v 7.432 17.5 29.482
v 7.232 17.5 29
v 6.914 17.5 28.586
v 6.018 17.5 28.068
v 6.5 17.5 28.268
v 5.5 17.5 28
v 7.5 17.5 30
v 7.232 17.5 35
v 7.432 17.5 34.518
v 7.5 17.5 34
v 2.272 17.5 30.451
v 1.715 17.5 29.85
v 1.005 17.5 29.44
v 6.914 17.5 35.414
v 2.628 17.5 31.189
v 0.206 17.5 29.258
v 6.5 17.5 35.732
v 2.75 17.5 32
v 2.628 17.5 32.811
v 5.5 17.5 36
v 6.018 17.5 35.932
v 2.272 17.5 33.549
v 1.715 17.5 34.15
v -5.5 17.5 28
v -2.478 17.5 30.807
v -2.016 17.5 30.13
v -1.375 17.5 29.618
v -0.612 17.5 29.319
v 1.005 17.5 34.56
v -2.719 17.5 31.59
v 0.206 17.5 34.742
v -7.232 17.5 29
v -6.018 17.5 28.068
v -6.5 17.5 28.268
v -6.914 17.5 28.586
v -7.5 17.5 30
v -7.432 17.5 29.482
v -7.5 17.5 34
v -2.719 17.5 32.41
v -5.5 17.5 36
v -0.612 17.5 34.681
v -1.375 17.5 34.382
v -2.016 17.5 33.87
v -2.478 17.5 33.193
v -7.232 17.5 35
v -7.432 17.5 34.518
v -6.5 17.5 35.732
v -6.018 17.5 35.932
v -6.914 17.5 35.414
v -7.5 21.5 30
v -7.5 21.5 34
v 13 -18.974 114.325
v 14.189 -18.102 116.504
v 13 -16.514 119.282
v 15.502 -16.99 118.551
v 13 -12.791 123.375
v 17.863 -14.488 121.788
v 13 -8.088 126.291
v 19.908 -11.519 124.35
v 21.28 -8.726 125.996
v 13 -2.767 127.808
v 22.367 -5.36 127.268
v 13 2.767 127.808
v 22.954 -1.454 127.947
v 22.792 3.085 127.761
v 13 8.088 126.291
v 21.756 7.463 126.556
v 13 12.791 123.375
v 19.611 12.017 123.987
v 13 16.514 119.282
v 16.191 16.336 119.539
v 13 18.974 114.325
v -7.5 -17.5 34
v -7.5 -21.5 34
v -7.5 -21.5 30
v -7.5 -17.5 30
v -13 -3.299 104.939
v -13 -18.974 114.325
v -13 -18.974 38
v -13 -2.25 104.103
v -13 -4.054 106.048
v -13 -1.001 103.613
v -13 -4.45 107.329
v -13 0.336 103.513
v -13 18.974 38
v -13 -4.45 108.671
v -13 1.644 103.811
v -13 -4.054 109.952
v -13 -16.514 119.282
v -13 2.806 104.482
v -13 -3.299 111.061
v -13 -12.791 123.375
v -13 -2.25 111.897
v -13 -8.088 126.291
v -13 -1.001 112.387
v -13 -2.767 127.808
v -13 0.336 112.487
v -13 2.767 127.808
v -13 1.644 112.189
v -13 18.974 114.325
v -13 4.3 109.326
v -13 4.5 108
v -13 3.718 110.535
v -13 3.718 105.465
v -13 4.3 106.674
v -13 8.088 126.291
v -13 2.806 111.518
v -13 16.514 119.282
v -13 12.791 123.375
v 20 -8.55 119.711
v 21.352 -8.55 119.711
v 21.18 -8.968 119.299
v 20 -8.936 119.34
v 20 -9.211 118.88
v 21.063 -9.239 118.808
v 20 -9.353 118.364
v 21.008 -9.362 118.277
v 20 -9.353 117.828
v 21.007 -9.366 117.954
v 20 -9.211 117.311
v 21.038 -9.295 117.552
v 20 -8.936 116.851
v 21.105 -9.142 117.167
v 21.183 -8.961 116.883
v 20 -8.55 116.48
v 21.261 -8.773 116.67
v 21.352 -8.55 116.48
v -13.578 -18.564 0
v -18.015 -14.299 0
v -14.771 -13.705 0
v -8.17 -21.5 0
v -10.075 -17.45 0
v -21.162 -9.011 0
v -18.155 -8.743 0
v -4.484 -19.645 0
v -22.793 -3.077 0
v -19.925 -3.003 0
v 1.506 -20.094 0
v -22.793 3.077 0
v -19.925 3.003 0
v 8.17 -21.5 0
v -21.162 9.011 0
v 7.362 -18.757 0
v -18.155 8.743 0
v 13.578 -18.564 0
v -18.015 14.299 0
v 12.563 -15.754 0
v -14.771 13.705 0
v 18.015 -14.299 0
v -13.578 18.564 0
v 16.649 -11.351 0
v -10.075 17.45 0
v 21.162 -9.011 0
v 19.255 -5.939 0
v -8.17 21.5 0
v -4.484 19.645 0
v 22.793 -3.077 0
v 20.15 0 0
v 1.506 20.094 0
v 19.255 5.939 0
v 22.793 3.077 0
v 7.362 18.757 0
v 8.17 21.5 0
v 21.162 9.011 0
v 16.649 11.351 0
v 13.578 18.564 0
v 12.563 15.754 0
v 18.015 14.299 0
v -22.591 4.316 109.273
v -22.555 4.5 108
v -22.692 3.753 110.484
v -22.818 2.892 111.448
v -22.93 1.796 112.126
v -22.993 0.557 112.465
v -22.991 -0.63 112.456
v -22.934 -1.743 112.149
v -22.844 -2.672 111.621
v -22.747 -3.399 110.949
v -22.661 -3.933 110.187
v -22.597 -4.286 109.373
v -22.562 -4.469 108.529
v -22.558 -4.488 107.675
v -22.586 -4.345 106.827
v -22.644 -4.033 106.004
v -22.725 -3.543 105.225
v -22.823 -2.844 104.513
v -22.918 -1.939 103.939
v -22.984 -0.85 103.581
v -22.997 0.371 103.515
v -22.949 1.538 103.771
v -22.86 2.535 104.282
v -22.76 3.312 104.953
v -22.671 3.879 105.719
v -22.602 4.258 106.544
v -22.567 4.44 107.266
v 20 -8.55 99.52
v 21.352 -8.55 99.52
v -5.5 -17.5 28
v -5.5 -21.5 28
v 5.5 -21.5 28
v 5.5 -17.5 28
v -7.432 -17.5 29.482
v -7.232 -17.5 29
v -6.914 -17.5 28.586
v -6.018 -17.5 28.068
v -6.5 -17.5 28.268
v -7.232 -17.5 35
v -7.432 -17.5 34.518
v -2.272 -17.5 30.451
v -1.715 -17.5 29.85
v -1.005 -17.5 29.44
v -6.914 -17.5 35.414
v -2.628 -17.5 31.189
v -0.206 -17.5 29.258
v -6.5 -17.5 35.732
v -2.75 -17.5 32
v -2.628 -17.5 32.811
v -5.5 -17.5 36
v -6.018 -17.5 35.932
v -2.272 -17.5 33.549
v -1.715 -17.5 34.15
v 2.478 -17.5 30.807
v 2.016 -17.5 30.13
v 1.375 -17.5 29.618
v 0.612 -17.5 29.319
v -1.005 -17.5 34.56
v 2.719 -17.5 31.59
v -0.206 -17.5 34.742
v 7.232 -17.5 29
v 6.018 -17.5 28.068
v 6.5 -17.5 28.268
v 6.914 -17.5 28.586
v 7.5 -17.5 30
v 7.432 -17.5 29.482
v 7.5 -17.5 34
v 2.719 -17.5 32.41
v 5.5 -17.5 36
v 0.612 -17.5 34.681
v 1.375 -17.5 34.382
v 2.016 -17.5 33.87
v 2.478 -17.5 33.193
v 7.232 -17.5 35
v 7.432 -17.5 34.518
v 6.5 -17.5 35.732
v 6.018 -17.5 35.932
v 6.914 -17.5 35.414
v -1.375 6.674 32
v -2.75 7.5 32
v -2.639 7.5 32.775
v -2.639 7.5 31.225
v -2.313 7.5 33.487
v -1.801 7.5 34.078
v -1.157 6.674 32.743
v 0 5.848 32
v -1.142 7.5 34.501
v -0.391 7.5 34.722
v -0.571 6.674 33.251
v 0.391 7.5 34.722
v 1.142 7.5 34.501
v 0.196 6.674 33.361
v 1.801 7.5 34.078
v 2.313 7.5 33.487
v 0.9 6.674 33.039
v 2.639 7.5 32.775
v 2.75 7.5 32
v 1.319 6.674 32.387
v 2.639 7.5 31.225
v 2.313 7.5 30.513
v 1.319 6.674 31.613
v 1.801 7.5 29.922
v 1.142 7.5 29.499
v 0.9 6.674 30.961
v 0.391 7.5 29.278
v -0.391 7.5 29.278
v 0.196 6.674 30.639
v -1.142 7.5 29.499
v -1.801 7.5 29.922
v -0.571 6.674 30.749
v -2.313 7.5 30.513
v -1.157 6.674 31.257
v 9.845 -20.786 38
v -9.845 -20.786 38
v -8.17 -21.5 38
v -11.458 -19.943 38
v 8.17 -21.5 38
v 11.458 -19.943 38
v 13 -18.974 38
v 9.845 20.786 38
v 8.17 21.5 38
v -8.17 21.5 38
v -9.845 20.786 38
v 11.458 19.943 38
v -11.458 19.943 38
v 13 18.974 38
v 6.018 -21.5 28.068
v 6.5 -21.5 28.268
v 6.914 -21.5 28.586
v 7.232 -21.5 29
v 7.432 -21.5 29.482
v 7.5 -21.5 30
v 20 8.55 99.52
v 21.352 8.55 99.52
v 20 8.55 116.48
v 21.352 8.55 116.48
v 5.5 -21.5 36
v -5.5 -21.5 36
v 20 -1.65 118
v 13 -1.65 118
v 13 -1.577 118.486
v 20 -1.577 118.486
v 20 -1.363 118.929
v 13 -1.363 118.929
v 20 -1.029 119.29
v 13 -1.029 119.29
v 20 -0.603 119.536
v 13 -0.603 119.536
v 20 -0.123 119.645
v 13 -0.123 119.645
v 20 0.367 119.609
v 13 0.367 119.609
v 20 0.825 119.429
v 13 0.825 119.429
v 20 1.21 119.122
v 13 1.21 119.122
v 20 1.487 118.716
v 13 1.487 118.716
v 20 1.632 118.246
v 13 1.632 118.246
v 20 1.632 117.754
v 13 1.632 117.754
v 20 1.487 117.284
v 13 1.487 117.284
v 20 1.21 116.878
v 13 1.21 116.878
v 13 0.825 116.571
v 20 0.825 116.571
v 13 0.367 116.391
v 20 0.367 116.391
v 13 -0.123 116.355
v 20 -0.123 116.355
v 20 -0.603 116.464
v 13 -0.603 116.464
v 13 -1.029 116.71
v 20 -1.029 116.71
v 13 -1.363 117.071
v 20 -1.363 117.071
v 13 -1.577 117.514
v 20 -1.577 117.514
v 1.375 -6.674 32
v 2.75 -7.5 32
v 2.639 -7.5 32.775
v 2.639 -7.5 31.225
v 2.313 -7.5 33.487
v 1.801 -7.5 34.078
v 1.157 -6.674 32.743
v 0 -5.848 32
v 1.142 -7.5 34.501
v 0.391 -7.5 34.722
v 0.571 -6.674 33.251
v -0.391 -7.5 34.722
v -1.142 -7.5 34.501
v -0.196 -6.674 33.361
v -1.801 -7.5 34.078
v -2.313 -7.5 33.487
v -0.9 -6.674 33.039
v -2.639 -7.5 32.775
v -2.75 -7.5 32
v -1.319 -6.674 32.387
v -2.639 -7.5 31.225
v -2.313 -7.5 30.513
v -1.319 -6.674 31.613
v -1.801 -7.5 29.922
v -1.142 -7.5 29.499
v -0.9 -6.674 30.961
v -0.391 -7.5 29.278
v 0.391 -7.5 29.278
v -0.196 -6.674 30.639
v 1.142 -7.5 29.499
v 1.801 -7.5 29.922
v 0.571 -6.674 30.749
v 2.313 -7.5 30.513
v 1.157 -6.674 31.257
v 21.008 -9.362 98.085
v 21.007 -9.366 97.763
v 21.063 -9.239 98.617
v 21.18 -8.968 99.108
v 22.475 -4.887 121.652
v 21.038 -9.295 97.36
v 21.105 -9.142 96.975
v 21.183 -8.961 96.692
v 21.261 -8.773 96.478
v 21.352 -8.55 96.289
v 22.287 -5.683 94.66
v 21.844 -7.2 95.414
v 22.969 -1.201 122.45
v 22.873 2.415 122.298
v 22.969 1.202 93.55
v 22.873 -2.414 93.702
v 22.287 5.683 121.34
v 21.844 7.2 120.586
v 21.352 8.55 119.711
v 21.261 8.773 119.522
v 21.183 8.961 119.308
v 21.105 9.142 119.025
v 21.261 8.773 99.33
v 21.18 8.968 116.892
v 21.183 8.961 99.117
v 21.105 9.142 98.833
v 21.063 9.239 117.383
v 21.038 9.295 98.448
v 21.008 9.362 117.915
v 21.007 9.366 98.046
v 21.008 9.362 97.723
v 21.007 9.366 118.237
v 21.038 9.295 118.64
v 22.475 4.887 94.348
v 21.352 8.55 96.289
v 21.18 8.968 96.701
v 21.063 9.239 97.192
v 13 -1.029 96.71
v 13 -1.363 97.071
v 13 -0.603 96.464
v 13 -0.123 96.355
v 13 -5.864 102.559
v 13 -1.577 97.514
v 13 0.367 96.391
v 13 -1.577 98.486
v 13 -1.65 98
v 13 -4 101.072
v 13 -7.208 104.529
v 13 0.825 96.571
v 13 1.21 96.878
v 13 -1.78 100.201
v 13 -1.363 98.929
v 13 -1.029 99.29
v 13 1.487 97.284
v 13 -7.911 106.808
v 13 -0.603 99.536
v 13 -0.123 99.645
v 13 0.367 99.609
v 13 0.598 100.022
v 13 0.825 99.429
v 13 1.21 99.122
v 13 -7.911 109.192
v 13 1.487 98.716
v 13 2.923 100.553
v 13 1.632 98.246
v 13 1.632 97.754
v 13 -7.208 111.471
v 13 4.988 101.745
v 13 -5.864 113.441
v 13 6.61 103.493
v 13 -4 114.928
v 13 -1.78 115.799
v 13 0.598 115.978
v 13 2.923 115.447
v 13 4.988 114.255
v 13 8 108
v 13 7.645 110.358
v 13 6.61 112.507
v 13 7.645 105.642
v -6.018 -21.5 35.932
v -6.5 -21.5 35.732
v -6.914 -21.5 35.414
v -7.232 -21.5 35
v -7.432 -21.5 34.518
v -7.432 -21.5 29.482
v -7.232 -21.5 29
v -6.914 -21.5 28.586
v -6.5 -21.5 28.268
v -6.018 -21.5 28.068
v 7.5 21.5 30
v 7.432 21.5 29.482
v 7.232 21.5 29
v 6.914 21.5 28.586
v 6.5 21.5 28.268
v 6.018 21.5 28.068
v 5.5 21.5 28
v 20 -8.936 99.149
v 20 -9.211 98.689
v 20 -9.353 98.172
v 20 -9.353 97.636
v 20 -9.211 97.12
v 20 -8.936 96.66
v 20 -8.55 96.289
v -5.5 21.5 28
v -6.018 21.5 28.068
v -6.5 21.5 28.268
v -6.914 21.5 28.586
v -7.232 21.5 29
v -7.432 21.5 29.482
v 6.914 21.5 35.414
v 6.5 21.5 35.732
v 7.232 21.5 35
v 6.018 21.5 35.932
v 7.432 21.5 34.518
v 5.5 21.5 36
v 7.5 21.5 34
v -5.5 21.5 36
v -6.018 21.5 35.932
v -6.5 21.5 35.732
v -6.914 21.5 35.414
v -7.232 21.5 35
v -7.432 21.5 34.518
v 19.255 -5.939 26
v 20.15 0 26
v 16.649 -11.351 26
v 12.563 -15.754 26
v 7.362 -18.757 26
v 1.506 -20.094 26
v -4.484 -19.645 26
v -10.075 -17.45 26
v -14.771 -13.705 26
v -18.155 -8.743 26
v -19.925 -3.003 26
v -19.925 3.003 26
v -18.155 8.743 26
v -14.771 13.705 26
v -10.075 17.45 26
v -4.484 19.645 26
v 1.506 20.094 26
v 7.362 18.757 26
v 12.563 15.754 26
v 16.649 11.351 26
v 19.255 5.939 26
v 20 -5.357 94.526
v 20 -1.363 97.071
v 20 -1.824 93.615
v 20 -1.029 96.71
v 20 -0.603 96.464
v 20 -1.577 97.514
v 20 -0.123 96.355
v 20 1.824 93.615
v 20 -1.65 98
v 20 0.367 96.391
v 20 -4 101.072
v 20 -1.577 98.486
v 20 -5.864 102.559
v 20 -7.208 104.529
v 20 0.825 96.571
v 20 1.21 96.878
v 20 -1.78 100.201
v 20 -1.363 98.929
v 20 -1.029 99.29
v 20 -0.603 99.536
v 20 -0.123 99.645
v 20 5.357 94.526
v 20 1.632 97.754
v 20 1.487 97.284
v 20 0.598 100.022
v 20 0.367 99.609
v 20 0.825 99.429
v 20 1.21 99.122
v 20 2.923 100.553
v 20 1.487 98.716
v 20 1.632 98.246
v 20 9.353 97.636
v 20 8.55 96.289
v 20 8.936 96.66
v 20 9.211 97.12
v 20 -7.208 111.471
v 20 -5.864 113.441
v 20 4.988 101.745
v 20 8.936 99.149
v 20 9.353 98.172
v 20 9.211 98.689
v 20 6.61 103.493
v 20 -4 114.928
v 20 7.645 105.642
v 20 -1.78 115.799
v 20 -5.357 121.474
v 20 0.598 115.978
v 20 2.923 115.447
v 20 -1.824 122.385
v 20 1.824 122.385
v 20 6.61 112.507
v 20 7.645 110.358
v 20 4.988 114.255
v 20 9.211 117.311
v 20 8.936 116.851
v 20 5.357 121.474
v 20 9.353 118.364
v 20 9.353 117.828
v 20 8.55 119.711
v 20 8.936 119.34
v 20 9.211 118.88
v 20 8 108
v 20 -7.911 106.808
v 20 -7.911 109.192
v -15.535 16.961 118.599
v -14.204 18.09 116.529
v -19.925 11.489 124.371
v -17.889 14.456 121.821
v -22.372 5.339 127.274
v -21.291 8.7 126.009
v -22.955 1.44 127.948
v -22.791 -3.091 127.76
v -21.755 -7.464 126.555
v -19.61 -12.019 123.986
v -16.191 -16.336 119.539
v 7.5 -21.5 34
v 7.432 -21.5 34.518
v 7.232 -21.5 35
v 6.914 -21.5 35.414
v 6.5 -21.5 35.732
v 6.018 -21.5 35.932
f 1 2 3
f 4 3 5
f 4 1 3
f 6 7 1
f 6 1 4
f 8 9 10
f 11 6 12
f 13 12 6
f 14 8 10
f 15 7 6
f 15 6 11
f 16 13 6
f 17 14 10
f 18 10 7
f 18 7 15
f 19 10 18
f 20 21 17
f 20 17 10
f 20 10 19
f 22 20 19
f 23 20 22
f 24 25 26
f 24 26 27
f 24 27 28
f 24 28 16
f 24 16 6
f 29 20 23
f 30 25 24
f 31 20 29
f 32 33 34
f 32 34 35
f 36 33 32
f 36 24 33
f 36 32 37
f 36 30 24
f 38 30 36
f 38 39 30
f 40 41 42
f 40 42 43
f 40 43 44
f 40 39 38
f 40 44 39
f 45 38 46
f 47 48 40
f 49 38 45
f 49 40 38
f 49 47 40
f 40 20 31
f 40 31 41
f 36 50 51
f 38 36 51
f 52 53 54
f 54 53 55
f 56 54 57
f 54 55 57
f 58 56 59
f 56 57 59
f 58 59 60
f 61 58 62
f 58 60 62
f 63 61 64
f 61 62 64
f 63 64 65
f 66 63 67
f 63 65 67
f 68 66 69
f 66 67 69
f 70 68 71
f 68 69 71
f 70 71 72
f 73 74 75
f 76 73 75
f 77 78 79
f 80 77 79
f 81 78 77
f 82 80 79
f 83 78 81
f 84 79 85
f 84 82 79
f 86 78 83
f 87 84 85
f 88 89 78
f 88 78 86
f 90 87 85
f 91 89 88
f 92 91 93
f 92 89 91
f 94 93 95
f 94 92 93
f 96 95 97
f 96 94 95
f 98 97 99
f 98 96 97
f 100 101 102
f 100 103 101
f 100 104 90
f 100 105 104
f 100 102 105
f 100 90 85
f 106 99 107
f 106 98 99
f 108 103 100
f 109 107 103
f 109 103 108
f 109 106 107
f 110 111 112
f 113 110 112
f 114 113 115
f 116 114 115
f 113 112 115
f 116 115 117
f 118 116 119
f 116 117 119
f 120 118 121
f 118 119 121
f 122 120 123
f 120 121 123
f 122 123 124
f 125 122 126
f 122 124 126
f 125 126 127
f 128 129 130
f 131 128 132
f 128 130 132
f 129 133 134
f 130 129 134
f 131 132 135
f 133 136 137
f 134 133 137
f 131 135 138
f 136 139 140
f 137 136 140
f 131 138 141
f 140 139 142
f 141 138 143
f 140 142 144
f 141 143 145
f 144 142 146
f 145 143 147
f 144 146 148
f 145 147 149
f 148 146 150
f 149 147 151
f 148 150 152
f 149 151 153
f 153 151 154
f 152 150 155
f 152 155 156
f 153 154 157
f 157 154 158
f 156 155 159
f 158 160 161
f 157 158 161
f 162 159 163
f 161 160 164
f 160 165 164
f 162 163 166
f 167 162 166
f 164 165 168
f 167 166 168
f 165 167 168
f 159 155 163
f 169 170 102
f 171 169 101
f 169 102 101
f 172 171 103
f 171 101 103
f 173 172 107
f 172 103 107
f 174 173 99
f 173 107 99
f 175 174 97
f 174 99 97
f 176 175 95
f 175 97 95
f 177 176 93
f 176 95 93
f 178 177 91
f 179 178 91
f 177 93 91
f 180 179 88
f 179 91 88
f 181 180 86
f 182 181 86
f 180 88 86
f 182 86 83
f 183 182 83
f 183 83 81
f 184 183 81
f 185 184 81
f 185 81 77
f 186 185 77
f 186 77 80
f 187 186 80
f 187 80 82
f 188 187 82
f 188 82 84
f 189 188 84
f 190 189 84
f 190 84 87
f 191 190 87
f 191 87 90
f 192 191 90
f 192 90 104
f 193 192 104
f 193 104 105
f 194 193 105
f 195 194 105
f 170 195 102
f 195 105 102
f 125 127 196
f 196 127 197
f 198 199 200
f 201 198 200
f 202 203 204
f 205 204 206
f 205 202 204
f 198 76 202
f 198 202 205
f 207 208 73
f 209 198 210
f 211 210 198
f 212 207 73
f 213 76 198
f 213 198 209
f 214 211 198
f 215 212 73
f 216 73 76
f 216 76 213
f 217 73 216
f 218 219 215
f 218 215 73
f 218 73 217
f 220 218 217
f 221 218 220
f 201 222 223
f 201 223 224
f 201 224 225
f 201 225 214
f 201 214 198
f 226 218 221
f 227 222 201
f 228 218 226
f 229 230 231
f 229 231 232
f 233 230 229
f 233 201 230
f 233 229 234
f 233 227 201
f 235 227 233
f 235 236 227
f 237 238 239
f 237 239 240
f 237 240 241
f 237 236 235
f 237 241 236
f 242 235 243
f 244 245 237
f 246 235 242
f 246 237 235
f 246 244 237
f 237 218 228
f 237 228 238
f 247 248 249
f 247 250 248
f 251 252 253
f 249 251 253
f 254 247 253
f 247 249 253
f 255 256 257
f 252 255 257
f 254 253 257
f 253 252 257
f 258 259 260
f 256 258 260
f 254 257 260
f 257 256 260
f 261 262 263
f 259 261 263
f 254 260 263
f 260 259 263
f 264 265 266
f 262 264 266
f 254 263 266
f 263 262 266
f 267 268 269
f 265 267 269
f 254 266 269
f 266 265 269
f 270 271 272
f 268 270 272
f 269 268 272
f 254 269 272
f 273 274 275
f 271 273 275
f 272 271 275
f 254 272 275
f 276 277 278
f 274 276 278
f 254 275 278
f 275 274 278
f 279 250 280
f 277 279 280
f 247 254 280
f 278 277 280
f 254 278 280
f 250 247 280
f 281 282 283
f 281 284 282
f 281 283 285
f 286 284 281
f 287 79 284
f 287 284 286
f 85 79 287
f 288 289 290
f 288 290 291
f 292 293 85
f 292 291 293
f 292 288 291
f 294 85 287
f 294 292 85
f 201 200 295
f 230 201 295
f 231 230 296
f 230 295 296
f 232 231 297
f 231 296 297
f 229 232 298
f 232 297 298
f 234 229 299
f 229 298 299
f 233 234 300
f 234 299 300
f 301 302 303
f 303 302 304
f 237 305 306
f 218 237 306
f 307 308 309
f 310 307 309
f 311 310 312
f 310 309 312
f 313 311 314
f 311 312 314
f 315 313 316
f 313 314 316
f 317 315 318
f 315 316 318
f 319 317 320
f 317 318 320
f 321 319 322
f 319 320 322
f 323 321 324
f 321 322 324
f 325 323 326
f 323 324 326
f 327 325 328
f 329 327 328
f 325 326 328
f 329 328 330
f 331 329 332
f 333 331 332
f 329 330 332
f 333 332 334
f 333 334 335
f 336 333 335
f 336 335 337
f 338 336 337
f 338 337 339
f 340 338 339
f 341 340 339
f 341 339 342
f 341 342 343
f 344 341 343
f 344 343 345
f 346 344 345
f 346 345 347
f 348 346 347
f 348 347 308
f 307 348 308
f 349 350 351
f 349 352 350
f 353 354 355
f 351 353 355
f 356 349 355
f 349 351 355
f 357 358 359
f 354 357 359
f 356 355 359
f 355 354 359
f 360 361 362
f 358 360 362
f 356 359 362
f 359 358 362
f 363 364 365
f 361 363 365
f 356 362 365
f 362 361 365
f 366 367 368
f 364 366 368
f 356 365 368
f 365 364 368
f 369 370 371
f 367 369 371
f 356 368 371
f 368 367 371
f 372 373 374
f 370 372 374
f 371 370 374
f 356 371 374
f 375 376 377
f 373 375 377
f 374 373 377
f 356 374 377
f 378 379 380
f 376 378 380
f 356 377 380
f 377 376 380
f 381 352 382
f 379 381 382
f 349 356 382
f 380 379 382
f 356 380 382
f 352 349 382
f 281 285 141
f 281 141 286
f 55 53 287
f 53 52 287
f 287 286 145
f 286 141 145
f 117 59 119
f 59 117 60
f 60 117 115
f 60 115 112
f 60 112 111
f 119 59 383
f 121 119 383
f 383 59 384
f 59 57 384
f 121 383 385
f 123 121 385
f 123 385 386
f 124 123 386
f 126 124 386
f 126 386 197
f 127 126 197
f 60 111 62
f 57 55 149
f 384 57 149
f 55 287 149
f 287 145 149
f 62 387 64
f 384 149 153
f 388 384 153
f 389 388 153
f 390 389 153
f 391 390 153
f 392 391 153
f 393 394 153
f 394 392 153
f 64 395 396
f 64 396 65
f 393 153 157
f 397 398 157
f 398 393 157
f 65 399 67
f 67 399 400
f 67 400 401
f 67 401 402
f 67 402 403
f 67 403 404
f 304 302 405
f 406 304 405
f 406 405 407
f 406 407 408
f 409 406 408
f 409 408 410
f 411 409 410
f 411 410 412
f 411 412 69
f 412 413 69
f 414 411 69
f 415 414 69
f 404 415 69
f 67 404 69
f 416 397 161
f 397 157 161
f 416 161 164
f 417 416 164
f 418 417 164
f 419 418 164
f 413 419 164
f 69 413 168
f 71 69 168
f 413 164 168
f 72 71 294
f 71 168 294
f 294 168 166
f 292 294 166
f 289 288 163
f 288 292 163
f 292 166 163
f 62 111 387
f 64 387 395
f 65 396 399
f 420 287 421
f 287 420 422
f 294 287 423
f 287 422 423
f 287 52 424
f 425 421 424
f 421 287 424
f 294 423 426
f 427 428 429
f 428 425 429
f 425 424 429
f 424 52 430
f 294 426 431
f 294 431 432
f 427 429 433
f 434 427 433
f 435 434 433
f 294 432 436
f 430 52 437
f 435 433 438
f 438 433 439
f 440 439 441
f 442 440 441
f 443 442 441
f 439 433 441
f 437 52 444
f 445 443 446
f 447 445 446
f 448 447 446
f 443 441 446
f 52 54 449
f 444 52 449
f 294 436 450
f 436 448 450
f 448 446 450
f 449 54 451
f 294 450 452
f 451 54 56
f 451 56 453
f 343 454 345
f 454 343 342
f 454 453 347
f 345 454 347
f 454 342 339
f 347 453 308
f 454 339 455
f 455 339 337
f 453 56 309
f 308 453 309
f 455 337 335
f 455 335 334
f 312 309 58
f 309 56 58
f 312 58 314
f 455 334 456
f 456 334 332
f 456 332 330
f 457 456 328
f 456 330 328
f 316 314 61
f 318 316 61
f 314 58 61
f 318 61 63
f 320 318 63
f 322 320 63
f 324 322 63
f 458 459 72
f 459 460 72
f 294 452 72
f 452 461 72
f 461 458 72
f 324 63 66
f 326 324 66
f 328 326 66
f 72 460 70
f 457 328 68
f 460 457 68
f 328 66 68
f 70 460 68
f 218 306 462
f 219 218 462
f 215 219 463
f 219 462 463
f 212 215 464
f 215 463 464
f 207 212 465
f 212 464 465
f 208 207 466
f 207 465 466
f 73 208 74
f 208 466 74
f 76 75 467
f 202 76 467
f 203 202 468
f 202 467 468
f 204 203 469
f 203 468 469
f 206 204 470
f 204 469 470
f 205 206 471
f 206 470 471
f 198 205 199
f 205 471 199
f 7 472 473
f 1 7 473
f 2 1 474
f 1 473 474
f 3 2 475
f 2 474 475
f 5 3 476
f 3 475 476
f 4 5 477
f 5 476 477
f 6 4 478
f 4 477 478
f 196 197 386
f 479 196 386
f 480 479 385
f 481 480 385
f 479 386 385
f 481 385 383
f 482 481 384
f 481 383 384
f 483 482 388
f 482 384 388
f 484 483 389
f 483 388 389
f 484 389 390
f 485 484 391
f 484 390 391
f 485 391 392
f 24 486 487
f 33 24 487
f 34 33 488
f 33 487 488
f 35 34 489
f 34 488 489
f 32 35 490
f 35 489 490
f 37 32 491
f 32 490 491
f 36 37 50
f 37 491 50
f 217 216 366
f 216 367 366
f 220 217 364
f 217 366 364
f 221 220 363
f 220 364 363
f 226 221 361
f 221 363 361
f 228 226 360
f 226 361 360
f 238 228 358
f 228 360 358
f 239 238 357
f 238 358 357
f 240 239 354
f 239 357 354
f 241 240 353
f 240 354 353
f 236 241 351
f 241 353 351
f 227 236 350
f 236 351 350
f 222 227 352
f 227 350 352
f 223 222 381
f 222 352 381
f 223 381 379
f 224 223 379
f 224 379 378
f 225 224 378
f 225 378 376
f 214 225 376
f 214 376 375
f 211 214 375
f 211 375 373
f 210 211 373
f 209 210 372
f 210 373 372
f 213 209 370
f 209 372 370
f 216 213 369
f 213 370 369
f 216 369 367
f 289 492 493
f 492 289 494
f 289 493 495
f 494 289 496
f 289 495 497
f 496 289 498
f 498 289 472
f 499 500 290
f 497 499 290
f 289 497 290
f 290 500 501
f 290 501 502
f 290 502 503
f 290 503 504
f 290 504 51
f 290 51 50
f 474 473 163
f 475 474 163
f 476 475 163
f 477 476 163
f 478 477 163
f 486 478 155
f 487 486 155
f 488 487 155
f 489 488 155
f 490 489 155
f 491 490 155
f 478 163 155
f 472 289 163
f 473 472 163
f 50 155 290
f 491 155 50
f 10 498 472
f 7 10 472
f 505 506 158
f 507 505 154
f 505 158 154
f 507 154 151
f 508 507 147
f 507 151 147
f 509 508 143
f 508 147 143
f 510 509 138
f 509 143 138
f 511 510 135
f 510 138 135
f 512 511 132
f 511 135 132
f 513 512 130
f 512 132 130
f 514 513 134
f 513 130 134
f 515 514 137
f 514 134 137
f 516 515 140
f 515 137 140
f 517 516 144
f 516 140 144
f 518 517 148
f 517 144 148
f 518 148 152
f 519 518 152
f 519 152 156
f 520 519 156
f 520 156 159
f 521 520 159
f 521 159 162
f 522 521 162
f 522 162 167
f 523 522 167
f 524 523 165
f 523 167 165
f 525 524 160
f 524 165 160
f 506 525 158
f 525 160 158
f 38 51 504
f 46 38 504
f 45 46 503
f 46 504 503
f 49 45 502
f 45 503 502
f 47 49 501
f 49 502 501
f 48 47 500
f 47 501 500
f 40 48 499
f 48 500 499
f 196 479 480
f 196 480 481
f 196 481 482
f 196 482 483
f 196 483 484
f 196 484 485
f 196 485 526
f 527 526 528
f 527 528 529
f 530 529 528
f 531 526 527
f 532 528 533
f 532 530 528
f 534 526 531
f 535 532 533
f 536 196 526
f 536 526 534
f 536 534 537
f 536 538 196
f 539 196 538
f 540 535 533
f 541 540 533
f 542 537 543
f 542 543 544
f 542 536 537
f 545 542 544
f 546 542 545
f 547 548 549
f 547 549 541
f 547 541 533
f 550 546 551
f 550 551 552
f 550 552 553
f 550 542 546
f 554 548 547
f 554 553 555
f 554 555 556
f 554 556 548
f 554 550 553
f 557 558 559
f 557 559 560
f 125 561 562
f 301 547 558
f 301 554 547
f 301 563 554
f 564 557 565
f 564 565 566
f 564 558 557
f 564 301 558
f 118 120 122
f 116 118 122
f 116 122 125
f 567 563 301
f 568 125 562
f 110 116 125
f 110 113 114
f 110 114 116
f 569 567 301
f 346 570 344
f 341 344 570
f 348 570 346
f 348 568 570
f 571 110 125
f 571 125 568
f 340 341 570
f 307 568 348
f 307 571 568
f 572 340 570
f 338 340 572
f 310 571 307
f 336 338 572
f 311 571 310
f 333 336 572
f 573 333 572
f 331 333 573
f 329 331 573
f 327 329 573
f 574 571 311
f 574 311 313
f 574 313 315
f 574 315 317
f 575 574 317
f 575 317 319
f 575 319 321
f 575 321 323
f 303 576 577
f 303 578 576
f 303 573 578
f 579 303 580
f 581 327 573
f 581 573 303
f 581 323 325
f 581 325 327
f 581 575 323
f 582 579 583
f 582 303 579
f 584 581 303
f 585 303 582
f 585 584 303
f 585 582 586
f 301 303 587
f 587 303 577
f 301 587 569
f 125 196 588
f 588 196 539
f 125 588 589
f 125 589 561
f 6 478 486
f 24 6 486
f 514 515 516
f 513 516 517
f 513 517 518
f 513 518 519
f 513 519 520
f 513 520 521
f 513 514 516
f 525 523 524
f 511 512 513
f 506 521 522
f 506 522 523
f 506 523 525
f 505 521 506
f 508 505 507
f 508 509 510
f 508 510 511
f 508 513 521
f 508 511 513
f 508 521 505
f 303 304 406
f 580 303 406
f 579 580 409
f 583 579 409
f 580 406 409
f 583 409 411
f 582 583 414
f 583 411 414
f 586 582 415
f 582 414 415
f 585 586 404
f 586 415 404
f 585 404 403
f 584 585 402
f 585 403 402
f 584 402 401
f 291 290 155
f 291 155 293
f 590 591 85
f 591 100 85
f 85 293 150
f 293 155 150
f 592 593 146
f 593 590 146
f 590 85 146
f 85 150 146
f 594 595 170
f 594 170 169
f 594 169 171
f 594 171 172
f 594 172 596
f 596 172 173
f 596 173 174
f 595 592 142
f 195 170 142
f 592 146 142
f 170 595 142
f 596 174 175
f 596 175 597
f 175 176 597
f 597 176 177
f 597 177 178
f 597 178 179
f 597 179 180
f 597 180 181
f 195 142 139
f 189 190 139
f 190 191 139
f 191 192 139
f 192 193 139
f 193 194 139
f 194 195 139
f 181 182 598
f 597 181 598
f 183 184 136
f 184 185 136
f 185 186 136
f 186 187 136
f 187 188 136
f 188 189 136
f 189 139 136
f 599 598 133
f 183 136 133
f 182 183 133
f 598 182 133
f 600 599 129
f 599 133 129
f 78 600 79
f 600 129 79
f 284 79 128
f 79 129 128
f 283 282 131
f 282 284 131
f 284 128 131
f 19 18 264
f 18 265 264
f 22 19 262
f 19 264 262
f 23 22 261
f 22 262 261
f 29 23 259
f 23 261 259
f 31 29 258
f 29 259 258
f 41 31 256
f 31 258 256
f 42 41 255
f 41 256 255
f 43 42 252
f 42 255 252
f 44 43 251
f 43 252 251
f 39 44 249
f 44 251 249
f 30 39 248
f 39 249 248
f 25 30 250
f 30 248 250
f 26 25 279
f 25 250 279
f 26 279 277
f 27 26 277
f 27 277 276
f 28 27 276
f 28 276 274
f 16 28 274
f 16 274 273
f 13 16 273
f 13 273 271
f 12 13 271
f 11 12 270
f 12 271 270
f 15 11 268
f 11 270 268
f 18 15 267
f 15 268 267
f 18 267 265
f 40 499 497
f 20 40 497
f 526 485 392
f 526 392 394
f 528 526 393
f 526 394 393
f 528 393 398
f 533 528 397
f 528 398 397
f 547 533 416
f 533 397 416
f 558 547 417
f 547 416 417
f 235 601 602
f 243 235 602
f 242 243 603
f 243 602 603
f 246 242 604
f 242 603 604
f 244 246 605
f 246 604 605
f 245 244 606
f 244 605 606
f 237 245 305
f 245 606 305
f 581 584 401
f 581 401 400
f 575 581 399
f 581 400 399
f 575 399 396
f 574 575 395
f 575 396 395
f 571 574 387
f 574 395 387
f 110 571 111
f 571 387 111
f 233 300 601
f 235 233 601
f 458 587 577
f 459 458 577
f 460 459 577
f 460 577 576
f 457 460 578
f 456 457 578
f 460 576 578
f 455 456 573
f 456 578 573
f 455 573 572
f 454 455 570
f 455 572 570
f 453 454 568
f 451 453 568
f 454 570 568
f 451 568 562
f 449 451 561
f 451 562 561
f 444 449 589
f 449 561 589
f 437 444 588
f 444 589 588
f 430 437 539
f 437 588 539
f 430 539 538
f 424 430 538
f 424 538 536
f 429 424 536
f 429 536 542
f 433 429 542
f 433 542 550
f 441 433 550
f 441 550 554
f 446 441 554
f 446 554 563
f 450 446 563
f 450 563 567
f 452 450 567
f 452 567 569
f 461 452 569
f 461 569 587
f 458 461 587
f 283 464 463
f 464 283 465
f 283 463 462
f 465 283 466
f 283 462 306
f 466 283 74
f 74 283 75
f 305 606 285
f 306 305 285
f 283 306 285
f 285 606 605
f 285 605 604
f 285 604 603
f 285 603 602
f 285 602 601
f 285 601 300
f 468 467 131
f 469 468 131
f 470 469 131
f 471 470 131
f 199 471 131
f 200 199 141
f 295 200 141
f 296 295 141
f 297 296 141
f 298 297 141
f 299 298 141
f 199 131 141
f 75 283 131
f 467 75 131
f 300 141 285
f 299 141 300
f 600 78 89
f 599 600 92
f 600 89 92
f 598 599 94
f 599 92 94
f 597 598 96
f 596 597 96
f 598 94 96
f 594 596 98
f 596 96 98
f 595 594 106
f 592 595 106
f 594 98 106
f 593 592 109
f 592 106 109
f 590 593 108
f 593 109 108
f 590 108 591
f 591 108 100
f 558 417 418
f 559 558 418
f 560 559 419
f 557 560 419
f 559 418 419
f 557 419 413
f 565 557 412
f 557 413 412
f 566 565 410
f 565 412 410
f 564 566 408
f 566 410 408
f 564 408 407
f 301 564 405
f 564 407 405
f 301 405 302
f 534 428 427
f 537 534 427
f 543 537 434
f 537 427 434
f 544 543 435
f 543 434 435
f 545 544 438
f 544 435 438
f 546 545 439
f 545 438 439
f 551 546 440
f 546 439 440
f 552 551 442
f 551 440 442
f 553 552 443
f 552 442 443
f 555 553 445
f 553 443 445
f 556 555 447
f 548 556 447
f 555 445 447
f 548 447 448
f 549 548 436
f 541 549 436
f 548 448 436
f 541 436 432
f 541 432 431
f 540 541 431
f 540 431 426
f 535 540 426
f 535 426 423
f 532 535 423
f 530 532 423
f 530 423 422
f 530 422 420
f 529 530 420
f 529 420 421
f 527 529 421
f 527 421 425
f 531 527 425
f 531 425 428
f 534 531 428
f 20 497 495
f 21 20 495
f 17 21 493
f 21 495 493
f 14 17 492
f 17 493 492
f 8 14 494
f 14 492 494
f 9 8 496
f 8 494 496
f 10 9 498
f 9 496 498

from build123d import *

# Parameters (mm, degrees)
F1_DEPTH  = 128
F3_W      = 26
F3_H      = 46
F4_DEPTH  = 90
F6_DEPTH  = 46.001
F8_DEPTH  = 3
F10_D     = 3.3
F10_DEPTH = 20
F10_TIP   = 0.9914200214
F11_R     = 8
F12_DEPTH = 25
F13_R     = 4.5
F14_DEPTH = 10.0010001
F15_R     = 20.15
F16_DEPTH = 26
F18_DEPTH = 4
F20_D     = 5.5
F20_DEPTH = 10
F20_TIP   = 1.6523667023
F22_DEPTH = 4
F24_D     = 5.5
F24_DEPTH = 10
F24_TIP   = 1.6523667023


with BuildPart() as f1:
    # F0 (on Top) → F1 (new body)
    with BuildSketch(Plane.XY):
        with BuildLine():
            Line((8.1700673192, 21.5), (-8.1700673192, 21.5))
            ThreePointArc((-8.1700673192, 21.5), (-23, 0), (-8.1700673192, -21.5))
            Line((-8.1700673192, -21.5), (8.1700673192, -21.5))
            ThreePointArc((8.1700673192, -21.5), (23, 0), (8.1700673192, 21.5))
        make_face()
    extrude(amount=F1_DEPTH)

    # F3 (on face) → F4 (cut)
    with BuildSketch(Plane.XY.offset(128)):
        Rectangle(F3_W, F3_H)
    extrude(amount=-F4_DEPTH, mode=Mode.SUBTRACT)

    # F5 (on offset) → F6 (cut, through all)
    with BuildSketch(Plane.YZ.offset(23)):
        with BuildLine():
            ThreePointArc((-19.9933908829, 108.5141215848), (-0.0190112138, 127.9999909643), (19.9923773451, 108.5521305014))
            Line((19.9923773451, 108.5521305014), (24.1833440959, 131.3719953258))
            Line((24.1833440959, 131.3719953258), (-19.9933908829, 131.3719953258))
            Line((-19.9933908829, 131.3719953258), (-19.9933908829, 108.5141215848))
        make_face()
    extrude(amount=-F6_DEPTH, mode=Mode.SUBTRACT)

    # F7 (on offset) → F8 (cut)
    with BuildSketch(Plane.YZ.offset(23)):
        with BuildLine():
            ThreePointArc((-8.55, 99.5196213389), (-9.3706896552, 97.9043111178), (-8.55, 96.2890008966))
            ThreePointArc((-8.55, 96.2890008966), (0, 93.5), (8.55, 96.2890008966))
            ThreePointArc((8.55, 96.2890008966), (9.3706896552, 97.9043111178), (8.55, 99.5196213389))
            Line((8.55, 99.5196213389), (8.55, 116.4803786611))
            ThreePointArc((8.55, 116.4803786611), (9.3706896552, 118.0956888822), (8.55, 119.7109991034))
            ThreePointArc((8.55, 119.7109991034), (0, 122.5), (-8.55, 119.7109991034))
            ThreePointArc((-8.55, 119.7109991034), (-9.3706896552, 118.0956888822), (-8.55, 116.4803786611))
            Line((-8.55, 116.4803786611), (-8.55, 99.5196213389))
        make_face()
    extrude(amount=-F8_DEPTH, mode=Mode.SUBTRACT)

    # F10
    with Locations(Plane.YZ.offset(20)):
        with Locations((0, 118), (0, 98)):
            Hole(F10_D / 2, depth=F10_DEPTH)
            with Locations((0, 0, -(F10_DEPTH + F10_TIP / 2))):  # 118° drill point
                Cone(0, F10_D / 2, F10_TIP, mode=Mode.SUBTRACT)

    # F11 (on face) → F12 (cut)
    with BuildSketch(Plane.YZ.offset(20)):
        with Locations((0, 108)):
            Circle(F11_R)
    extrude(amount=-F12_DEPTH, mode=Mode.SUBTRACT)

    # F13 (on face) → F14 (cut, through all)
    with BuildSketch(Plane.YZ.offset(-13)):
        with Locations((0, 108)):
            Circle(F13_R)
    extrude(amount=-F14_DEPTH, mode=Mode.SUBTRACT)

    # F15 (on face) → F16 (cut)
    with BuildSketch(Plane(origin=(0, 0, 0), x_dir=(1, 0, 0), z_dir=(0, 0, -1))):
        Circle(F15_R)
    extrude(amount=-F16_DEPTH, mode=Mode.SUBTRACT)

    # F17 (on face) → F18 (cut)
    with BuildSketch(Plane.XZ.offset(21.5)):
        with BuildLine():
            Line((5.5, 36), (-5.5, 36))
            ThreePointArc((-5.5, 36), (-6.9142135624, 35.4142135624), (-7.5, 34))
            Line((-7.5, 34), (-7.5, 30))
            ThreePointArc((-7.5, 30), (-6.9142135624, 28.5857864376), (-5.5, 28))
            Line((-5.5, 28), (5.5, 28))
            ThreePointArc((5.5, 28), (6.9142135624, 28.5857864376), (7.5, 30))
            Line((7.5, 30), (7.5, 34))
            ThreePointArc((7.5, 34), (6.9142135624, 35.4142135624), (5.5, 36))
        make_face()
    extrude(amount=-F18_DEPTH, mode=Mode.SUBTRACT)

    # F20
    with Locations(Plane.XZ.offset(17.5)):
        with Locations((0, 32)):
            Hole(F20_D / 2, depth=F20_DEPTH)
            with Locations((0, 0, -(F20_DEPTH + F20_TIP / 2))):  # 118° drill point
                Cone(0, F20_D / 2, F20_TIP, mode=Mode.SUBTRACT)

    # F21 (on face) → F22 (cut)
    with BuildSketch(Plane(origin=(0, 21.5, 0), x_dir=(-1, 0, 0), z_dir=(0, 1, 0))):
        with BuildLine():
            Line((5.5, 36), (-5.5, 36))
            ThreePointArc((-5.5, 36), (-6.9142135624, 35.4142135624), (-7.5, 34))
            Line((-7.5, 34), (-7.5, 30))
            ThreePointArc((-7.5, 30), (-6.9142135624, 28.5857864376), (-5.5, 28))
            Line((-5.5, 28), (5.5, 28))
            ThreePointArc((5.5, 28), (6.9142135624, 28.5857864376), (7.5, 30))
            Line((7.5, 30), (7.5, 34))
            ThreePointArc((7.5, 34), (6.9142135624, 35.4142135624), (5.5, 36))
        make_face()
    extrude(amount=-F22_DEPTH, mode=Mode.SUBTRACT)

    # F24
    with Locations(Plane(origin=(0, 17.5, 0), x_dir=(-1, 0, 0), z_dir=(0, 1, 0))):
        with Locations((0, 32)):
            Hole(F24_D / 2, depth=F24_DEPTH)
            with Locations((0, 0, -(F24_DEPTH + F24_TIP / 2))):  # 118° drill point
                Cone(0, F24_D / 2, F24_TIP, mode=Mode.SUBTRACT)


solid = f1.part
